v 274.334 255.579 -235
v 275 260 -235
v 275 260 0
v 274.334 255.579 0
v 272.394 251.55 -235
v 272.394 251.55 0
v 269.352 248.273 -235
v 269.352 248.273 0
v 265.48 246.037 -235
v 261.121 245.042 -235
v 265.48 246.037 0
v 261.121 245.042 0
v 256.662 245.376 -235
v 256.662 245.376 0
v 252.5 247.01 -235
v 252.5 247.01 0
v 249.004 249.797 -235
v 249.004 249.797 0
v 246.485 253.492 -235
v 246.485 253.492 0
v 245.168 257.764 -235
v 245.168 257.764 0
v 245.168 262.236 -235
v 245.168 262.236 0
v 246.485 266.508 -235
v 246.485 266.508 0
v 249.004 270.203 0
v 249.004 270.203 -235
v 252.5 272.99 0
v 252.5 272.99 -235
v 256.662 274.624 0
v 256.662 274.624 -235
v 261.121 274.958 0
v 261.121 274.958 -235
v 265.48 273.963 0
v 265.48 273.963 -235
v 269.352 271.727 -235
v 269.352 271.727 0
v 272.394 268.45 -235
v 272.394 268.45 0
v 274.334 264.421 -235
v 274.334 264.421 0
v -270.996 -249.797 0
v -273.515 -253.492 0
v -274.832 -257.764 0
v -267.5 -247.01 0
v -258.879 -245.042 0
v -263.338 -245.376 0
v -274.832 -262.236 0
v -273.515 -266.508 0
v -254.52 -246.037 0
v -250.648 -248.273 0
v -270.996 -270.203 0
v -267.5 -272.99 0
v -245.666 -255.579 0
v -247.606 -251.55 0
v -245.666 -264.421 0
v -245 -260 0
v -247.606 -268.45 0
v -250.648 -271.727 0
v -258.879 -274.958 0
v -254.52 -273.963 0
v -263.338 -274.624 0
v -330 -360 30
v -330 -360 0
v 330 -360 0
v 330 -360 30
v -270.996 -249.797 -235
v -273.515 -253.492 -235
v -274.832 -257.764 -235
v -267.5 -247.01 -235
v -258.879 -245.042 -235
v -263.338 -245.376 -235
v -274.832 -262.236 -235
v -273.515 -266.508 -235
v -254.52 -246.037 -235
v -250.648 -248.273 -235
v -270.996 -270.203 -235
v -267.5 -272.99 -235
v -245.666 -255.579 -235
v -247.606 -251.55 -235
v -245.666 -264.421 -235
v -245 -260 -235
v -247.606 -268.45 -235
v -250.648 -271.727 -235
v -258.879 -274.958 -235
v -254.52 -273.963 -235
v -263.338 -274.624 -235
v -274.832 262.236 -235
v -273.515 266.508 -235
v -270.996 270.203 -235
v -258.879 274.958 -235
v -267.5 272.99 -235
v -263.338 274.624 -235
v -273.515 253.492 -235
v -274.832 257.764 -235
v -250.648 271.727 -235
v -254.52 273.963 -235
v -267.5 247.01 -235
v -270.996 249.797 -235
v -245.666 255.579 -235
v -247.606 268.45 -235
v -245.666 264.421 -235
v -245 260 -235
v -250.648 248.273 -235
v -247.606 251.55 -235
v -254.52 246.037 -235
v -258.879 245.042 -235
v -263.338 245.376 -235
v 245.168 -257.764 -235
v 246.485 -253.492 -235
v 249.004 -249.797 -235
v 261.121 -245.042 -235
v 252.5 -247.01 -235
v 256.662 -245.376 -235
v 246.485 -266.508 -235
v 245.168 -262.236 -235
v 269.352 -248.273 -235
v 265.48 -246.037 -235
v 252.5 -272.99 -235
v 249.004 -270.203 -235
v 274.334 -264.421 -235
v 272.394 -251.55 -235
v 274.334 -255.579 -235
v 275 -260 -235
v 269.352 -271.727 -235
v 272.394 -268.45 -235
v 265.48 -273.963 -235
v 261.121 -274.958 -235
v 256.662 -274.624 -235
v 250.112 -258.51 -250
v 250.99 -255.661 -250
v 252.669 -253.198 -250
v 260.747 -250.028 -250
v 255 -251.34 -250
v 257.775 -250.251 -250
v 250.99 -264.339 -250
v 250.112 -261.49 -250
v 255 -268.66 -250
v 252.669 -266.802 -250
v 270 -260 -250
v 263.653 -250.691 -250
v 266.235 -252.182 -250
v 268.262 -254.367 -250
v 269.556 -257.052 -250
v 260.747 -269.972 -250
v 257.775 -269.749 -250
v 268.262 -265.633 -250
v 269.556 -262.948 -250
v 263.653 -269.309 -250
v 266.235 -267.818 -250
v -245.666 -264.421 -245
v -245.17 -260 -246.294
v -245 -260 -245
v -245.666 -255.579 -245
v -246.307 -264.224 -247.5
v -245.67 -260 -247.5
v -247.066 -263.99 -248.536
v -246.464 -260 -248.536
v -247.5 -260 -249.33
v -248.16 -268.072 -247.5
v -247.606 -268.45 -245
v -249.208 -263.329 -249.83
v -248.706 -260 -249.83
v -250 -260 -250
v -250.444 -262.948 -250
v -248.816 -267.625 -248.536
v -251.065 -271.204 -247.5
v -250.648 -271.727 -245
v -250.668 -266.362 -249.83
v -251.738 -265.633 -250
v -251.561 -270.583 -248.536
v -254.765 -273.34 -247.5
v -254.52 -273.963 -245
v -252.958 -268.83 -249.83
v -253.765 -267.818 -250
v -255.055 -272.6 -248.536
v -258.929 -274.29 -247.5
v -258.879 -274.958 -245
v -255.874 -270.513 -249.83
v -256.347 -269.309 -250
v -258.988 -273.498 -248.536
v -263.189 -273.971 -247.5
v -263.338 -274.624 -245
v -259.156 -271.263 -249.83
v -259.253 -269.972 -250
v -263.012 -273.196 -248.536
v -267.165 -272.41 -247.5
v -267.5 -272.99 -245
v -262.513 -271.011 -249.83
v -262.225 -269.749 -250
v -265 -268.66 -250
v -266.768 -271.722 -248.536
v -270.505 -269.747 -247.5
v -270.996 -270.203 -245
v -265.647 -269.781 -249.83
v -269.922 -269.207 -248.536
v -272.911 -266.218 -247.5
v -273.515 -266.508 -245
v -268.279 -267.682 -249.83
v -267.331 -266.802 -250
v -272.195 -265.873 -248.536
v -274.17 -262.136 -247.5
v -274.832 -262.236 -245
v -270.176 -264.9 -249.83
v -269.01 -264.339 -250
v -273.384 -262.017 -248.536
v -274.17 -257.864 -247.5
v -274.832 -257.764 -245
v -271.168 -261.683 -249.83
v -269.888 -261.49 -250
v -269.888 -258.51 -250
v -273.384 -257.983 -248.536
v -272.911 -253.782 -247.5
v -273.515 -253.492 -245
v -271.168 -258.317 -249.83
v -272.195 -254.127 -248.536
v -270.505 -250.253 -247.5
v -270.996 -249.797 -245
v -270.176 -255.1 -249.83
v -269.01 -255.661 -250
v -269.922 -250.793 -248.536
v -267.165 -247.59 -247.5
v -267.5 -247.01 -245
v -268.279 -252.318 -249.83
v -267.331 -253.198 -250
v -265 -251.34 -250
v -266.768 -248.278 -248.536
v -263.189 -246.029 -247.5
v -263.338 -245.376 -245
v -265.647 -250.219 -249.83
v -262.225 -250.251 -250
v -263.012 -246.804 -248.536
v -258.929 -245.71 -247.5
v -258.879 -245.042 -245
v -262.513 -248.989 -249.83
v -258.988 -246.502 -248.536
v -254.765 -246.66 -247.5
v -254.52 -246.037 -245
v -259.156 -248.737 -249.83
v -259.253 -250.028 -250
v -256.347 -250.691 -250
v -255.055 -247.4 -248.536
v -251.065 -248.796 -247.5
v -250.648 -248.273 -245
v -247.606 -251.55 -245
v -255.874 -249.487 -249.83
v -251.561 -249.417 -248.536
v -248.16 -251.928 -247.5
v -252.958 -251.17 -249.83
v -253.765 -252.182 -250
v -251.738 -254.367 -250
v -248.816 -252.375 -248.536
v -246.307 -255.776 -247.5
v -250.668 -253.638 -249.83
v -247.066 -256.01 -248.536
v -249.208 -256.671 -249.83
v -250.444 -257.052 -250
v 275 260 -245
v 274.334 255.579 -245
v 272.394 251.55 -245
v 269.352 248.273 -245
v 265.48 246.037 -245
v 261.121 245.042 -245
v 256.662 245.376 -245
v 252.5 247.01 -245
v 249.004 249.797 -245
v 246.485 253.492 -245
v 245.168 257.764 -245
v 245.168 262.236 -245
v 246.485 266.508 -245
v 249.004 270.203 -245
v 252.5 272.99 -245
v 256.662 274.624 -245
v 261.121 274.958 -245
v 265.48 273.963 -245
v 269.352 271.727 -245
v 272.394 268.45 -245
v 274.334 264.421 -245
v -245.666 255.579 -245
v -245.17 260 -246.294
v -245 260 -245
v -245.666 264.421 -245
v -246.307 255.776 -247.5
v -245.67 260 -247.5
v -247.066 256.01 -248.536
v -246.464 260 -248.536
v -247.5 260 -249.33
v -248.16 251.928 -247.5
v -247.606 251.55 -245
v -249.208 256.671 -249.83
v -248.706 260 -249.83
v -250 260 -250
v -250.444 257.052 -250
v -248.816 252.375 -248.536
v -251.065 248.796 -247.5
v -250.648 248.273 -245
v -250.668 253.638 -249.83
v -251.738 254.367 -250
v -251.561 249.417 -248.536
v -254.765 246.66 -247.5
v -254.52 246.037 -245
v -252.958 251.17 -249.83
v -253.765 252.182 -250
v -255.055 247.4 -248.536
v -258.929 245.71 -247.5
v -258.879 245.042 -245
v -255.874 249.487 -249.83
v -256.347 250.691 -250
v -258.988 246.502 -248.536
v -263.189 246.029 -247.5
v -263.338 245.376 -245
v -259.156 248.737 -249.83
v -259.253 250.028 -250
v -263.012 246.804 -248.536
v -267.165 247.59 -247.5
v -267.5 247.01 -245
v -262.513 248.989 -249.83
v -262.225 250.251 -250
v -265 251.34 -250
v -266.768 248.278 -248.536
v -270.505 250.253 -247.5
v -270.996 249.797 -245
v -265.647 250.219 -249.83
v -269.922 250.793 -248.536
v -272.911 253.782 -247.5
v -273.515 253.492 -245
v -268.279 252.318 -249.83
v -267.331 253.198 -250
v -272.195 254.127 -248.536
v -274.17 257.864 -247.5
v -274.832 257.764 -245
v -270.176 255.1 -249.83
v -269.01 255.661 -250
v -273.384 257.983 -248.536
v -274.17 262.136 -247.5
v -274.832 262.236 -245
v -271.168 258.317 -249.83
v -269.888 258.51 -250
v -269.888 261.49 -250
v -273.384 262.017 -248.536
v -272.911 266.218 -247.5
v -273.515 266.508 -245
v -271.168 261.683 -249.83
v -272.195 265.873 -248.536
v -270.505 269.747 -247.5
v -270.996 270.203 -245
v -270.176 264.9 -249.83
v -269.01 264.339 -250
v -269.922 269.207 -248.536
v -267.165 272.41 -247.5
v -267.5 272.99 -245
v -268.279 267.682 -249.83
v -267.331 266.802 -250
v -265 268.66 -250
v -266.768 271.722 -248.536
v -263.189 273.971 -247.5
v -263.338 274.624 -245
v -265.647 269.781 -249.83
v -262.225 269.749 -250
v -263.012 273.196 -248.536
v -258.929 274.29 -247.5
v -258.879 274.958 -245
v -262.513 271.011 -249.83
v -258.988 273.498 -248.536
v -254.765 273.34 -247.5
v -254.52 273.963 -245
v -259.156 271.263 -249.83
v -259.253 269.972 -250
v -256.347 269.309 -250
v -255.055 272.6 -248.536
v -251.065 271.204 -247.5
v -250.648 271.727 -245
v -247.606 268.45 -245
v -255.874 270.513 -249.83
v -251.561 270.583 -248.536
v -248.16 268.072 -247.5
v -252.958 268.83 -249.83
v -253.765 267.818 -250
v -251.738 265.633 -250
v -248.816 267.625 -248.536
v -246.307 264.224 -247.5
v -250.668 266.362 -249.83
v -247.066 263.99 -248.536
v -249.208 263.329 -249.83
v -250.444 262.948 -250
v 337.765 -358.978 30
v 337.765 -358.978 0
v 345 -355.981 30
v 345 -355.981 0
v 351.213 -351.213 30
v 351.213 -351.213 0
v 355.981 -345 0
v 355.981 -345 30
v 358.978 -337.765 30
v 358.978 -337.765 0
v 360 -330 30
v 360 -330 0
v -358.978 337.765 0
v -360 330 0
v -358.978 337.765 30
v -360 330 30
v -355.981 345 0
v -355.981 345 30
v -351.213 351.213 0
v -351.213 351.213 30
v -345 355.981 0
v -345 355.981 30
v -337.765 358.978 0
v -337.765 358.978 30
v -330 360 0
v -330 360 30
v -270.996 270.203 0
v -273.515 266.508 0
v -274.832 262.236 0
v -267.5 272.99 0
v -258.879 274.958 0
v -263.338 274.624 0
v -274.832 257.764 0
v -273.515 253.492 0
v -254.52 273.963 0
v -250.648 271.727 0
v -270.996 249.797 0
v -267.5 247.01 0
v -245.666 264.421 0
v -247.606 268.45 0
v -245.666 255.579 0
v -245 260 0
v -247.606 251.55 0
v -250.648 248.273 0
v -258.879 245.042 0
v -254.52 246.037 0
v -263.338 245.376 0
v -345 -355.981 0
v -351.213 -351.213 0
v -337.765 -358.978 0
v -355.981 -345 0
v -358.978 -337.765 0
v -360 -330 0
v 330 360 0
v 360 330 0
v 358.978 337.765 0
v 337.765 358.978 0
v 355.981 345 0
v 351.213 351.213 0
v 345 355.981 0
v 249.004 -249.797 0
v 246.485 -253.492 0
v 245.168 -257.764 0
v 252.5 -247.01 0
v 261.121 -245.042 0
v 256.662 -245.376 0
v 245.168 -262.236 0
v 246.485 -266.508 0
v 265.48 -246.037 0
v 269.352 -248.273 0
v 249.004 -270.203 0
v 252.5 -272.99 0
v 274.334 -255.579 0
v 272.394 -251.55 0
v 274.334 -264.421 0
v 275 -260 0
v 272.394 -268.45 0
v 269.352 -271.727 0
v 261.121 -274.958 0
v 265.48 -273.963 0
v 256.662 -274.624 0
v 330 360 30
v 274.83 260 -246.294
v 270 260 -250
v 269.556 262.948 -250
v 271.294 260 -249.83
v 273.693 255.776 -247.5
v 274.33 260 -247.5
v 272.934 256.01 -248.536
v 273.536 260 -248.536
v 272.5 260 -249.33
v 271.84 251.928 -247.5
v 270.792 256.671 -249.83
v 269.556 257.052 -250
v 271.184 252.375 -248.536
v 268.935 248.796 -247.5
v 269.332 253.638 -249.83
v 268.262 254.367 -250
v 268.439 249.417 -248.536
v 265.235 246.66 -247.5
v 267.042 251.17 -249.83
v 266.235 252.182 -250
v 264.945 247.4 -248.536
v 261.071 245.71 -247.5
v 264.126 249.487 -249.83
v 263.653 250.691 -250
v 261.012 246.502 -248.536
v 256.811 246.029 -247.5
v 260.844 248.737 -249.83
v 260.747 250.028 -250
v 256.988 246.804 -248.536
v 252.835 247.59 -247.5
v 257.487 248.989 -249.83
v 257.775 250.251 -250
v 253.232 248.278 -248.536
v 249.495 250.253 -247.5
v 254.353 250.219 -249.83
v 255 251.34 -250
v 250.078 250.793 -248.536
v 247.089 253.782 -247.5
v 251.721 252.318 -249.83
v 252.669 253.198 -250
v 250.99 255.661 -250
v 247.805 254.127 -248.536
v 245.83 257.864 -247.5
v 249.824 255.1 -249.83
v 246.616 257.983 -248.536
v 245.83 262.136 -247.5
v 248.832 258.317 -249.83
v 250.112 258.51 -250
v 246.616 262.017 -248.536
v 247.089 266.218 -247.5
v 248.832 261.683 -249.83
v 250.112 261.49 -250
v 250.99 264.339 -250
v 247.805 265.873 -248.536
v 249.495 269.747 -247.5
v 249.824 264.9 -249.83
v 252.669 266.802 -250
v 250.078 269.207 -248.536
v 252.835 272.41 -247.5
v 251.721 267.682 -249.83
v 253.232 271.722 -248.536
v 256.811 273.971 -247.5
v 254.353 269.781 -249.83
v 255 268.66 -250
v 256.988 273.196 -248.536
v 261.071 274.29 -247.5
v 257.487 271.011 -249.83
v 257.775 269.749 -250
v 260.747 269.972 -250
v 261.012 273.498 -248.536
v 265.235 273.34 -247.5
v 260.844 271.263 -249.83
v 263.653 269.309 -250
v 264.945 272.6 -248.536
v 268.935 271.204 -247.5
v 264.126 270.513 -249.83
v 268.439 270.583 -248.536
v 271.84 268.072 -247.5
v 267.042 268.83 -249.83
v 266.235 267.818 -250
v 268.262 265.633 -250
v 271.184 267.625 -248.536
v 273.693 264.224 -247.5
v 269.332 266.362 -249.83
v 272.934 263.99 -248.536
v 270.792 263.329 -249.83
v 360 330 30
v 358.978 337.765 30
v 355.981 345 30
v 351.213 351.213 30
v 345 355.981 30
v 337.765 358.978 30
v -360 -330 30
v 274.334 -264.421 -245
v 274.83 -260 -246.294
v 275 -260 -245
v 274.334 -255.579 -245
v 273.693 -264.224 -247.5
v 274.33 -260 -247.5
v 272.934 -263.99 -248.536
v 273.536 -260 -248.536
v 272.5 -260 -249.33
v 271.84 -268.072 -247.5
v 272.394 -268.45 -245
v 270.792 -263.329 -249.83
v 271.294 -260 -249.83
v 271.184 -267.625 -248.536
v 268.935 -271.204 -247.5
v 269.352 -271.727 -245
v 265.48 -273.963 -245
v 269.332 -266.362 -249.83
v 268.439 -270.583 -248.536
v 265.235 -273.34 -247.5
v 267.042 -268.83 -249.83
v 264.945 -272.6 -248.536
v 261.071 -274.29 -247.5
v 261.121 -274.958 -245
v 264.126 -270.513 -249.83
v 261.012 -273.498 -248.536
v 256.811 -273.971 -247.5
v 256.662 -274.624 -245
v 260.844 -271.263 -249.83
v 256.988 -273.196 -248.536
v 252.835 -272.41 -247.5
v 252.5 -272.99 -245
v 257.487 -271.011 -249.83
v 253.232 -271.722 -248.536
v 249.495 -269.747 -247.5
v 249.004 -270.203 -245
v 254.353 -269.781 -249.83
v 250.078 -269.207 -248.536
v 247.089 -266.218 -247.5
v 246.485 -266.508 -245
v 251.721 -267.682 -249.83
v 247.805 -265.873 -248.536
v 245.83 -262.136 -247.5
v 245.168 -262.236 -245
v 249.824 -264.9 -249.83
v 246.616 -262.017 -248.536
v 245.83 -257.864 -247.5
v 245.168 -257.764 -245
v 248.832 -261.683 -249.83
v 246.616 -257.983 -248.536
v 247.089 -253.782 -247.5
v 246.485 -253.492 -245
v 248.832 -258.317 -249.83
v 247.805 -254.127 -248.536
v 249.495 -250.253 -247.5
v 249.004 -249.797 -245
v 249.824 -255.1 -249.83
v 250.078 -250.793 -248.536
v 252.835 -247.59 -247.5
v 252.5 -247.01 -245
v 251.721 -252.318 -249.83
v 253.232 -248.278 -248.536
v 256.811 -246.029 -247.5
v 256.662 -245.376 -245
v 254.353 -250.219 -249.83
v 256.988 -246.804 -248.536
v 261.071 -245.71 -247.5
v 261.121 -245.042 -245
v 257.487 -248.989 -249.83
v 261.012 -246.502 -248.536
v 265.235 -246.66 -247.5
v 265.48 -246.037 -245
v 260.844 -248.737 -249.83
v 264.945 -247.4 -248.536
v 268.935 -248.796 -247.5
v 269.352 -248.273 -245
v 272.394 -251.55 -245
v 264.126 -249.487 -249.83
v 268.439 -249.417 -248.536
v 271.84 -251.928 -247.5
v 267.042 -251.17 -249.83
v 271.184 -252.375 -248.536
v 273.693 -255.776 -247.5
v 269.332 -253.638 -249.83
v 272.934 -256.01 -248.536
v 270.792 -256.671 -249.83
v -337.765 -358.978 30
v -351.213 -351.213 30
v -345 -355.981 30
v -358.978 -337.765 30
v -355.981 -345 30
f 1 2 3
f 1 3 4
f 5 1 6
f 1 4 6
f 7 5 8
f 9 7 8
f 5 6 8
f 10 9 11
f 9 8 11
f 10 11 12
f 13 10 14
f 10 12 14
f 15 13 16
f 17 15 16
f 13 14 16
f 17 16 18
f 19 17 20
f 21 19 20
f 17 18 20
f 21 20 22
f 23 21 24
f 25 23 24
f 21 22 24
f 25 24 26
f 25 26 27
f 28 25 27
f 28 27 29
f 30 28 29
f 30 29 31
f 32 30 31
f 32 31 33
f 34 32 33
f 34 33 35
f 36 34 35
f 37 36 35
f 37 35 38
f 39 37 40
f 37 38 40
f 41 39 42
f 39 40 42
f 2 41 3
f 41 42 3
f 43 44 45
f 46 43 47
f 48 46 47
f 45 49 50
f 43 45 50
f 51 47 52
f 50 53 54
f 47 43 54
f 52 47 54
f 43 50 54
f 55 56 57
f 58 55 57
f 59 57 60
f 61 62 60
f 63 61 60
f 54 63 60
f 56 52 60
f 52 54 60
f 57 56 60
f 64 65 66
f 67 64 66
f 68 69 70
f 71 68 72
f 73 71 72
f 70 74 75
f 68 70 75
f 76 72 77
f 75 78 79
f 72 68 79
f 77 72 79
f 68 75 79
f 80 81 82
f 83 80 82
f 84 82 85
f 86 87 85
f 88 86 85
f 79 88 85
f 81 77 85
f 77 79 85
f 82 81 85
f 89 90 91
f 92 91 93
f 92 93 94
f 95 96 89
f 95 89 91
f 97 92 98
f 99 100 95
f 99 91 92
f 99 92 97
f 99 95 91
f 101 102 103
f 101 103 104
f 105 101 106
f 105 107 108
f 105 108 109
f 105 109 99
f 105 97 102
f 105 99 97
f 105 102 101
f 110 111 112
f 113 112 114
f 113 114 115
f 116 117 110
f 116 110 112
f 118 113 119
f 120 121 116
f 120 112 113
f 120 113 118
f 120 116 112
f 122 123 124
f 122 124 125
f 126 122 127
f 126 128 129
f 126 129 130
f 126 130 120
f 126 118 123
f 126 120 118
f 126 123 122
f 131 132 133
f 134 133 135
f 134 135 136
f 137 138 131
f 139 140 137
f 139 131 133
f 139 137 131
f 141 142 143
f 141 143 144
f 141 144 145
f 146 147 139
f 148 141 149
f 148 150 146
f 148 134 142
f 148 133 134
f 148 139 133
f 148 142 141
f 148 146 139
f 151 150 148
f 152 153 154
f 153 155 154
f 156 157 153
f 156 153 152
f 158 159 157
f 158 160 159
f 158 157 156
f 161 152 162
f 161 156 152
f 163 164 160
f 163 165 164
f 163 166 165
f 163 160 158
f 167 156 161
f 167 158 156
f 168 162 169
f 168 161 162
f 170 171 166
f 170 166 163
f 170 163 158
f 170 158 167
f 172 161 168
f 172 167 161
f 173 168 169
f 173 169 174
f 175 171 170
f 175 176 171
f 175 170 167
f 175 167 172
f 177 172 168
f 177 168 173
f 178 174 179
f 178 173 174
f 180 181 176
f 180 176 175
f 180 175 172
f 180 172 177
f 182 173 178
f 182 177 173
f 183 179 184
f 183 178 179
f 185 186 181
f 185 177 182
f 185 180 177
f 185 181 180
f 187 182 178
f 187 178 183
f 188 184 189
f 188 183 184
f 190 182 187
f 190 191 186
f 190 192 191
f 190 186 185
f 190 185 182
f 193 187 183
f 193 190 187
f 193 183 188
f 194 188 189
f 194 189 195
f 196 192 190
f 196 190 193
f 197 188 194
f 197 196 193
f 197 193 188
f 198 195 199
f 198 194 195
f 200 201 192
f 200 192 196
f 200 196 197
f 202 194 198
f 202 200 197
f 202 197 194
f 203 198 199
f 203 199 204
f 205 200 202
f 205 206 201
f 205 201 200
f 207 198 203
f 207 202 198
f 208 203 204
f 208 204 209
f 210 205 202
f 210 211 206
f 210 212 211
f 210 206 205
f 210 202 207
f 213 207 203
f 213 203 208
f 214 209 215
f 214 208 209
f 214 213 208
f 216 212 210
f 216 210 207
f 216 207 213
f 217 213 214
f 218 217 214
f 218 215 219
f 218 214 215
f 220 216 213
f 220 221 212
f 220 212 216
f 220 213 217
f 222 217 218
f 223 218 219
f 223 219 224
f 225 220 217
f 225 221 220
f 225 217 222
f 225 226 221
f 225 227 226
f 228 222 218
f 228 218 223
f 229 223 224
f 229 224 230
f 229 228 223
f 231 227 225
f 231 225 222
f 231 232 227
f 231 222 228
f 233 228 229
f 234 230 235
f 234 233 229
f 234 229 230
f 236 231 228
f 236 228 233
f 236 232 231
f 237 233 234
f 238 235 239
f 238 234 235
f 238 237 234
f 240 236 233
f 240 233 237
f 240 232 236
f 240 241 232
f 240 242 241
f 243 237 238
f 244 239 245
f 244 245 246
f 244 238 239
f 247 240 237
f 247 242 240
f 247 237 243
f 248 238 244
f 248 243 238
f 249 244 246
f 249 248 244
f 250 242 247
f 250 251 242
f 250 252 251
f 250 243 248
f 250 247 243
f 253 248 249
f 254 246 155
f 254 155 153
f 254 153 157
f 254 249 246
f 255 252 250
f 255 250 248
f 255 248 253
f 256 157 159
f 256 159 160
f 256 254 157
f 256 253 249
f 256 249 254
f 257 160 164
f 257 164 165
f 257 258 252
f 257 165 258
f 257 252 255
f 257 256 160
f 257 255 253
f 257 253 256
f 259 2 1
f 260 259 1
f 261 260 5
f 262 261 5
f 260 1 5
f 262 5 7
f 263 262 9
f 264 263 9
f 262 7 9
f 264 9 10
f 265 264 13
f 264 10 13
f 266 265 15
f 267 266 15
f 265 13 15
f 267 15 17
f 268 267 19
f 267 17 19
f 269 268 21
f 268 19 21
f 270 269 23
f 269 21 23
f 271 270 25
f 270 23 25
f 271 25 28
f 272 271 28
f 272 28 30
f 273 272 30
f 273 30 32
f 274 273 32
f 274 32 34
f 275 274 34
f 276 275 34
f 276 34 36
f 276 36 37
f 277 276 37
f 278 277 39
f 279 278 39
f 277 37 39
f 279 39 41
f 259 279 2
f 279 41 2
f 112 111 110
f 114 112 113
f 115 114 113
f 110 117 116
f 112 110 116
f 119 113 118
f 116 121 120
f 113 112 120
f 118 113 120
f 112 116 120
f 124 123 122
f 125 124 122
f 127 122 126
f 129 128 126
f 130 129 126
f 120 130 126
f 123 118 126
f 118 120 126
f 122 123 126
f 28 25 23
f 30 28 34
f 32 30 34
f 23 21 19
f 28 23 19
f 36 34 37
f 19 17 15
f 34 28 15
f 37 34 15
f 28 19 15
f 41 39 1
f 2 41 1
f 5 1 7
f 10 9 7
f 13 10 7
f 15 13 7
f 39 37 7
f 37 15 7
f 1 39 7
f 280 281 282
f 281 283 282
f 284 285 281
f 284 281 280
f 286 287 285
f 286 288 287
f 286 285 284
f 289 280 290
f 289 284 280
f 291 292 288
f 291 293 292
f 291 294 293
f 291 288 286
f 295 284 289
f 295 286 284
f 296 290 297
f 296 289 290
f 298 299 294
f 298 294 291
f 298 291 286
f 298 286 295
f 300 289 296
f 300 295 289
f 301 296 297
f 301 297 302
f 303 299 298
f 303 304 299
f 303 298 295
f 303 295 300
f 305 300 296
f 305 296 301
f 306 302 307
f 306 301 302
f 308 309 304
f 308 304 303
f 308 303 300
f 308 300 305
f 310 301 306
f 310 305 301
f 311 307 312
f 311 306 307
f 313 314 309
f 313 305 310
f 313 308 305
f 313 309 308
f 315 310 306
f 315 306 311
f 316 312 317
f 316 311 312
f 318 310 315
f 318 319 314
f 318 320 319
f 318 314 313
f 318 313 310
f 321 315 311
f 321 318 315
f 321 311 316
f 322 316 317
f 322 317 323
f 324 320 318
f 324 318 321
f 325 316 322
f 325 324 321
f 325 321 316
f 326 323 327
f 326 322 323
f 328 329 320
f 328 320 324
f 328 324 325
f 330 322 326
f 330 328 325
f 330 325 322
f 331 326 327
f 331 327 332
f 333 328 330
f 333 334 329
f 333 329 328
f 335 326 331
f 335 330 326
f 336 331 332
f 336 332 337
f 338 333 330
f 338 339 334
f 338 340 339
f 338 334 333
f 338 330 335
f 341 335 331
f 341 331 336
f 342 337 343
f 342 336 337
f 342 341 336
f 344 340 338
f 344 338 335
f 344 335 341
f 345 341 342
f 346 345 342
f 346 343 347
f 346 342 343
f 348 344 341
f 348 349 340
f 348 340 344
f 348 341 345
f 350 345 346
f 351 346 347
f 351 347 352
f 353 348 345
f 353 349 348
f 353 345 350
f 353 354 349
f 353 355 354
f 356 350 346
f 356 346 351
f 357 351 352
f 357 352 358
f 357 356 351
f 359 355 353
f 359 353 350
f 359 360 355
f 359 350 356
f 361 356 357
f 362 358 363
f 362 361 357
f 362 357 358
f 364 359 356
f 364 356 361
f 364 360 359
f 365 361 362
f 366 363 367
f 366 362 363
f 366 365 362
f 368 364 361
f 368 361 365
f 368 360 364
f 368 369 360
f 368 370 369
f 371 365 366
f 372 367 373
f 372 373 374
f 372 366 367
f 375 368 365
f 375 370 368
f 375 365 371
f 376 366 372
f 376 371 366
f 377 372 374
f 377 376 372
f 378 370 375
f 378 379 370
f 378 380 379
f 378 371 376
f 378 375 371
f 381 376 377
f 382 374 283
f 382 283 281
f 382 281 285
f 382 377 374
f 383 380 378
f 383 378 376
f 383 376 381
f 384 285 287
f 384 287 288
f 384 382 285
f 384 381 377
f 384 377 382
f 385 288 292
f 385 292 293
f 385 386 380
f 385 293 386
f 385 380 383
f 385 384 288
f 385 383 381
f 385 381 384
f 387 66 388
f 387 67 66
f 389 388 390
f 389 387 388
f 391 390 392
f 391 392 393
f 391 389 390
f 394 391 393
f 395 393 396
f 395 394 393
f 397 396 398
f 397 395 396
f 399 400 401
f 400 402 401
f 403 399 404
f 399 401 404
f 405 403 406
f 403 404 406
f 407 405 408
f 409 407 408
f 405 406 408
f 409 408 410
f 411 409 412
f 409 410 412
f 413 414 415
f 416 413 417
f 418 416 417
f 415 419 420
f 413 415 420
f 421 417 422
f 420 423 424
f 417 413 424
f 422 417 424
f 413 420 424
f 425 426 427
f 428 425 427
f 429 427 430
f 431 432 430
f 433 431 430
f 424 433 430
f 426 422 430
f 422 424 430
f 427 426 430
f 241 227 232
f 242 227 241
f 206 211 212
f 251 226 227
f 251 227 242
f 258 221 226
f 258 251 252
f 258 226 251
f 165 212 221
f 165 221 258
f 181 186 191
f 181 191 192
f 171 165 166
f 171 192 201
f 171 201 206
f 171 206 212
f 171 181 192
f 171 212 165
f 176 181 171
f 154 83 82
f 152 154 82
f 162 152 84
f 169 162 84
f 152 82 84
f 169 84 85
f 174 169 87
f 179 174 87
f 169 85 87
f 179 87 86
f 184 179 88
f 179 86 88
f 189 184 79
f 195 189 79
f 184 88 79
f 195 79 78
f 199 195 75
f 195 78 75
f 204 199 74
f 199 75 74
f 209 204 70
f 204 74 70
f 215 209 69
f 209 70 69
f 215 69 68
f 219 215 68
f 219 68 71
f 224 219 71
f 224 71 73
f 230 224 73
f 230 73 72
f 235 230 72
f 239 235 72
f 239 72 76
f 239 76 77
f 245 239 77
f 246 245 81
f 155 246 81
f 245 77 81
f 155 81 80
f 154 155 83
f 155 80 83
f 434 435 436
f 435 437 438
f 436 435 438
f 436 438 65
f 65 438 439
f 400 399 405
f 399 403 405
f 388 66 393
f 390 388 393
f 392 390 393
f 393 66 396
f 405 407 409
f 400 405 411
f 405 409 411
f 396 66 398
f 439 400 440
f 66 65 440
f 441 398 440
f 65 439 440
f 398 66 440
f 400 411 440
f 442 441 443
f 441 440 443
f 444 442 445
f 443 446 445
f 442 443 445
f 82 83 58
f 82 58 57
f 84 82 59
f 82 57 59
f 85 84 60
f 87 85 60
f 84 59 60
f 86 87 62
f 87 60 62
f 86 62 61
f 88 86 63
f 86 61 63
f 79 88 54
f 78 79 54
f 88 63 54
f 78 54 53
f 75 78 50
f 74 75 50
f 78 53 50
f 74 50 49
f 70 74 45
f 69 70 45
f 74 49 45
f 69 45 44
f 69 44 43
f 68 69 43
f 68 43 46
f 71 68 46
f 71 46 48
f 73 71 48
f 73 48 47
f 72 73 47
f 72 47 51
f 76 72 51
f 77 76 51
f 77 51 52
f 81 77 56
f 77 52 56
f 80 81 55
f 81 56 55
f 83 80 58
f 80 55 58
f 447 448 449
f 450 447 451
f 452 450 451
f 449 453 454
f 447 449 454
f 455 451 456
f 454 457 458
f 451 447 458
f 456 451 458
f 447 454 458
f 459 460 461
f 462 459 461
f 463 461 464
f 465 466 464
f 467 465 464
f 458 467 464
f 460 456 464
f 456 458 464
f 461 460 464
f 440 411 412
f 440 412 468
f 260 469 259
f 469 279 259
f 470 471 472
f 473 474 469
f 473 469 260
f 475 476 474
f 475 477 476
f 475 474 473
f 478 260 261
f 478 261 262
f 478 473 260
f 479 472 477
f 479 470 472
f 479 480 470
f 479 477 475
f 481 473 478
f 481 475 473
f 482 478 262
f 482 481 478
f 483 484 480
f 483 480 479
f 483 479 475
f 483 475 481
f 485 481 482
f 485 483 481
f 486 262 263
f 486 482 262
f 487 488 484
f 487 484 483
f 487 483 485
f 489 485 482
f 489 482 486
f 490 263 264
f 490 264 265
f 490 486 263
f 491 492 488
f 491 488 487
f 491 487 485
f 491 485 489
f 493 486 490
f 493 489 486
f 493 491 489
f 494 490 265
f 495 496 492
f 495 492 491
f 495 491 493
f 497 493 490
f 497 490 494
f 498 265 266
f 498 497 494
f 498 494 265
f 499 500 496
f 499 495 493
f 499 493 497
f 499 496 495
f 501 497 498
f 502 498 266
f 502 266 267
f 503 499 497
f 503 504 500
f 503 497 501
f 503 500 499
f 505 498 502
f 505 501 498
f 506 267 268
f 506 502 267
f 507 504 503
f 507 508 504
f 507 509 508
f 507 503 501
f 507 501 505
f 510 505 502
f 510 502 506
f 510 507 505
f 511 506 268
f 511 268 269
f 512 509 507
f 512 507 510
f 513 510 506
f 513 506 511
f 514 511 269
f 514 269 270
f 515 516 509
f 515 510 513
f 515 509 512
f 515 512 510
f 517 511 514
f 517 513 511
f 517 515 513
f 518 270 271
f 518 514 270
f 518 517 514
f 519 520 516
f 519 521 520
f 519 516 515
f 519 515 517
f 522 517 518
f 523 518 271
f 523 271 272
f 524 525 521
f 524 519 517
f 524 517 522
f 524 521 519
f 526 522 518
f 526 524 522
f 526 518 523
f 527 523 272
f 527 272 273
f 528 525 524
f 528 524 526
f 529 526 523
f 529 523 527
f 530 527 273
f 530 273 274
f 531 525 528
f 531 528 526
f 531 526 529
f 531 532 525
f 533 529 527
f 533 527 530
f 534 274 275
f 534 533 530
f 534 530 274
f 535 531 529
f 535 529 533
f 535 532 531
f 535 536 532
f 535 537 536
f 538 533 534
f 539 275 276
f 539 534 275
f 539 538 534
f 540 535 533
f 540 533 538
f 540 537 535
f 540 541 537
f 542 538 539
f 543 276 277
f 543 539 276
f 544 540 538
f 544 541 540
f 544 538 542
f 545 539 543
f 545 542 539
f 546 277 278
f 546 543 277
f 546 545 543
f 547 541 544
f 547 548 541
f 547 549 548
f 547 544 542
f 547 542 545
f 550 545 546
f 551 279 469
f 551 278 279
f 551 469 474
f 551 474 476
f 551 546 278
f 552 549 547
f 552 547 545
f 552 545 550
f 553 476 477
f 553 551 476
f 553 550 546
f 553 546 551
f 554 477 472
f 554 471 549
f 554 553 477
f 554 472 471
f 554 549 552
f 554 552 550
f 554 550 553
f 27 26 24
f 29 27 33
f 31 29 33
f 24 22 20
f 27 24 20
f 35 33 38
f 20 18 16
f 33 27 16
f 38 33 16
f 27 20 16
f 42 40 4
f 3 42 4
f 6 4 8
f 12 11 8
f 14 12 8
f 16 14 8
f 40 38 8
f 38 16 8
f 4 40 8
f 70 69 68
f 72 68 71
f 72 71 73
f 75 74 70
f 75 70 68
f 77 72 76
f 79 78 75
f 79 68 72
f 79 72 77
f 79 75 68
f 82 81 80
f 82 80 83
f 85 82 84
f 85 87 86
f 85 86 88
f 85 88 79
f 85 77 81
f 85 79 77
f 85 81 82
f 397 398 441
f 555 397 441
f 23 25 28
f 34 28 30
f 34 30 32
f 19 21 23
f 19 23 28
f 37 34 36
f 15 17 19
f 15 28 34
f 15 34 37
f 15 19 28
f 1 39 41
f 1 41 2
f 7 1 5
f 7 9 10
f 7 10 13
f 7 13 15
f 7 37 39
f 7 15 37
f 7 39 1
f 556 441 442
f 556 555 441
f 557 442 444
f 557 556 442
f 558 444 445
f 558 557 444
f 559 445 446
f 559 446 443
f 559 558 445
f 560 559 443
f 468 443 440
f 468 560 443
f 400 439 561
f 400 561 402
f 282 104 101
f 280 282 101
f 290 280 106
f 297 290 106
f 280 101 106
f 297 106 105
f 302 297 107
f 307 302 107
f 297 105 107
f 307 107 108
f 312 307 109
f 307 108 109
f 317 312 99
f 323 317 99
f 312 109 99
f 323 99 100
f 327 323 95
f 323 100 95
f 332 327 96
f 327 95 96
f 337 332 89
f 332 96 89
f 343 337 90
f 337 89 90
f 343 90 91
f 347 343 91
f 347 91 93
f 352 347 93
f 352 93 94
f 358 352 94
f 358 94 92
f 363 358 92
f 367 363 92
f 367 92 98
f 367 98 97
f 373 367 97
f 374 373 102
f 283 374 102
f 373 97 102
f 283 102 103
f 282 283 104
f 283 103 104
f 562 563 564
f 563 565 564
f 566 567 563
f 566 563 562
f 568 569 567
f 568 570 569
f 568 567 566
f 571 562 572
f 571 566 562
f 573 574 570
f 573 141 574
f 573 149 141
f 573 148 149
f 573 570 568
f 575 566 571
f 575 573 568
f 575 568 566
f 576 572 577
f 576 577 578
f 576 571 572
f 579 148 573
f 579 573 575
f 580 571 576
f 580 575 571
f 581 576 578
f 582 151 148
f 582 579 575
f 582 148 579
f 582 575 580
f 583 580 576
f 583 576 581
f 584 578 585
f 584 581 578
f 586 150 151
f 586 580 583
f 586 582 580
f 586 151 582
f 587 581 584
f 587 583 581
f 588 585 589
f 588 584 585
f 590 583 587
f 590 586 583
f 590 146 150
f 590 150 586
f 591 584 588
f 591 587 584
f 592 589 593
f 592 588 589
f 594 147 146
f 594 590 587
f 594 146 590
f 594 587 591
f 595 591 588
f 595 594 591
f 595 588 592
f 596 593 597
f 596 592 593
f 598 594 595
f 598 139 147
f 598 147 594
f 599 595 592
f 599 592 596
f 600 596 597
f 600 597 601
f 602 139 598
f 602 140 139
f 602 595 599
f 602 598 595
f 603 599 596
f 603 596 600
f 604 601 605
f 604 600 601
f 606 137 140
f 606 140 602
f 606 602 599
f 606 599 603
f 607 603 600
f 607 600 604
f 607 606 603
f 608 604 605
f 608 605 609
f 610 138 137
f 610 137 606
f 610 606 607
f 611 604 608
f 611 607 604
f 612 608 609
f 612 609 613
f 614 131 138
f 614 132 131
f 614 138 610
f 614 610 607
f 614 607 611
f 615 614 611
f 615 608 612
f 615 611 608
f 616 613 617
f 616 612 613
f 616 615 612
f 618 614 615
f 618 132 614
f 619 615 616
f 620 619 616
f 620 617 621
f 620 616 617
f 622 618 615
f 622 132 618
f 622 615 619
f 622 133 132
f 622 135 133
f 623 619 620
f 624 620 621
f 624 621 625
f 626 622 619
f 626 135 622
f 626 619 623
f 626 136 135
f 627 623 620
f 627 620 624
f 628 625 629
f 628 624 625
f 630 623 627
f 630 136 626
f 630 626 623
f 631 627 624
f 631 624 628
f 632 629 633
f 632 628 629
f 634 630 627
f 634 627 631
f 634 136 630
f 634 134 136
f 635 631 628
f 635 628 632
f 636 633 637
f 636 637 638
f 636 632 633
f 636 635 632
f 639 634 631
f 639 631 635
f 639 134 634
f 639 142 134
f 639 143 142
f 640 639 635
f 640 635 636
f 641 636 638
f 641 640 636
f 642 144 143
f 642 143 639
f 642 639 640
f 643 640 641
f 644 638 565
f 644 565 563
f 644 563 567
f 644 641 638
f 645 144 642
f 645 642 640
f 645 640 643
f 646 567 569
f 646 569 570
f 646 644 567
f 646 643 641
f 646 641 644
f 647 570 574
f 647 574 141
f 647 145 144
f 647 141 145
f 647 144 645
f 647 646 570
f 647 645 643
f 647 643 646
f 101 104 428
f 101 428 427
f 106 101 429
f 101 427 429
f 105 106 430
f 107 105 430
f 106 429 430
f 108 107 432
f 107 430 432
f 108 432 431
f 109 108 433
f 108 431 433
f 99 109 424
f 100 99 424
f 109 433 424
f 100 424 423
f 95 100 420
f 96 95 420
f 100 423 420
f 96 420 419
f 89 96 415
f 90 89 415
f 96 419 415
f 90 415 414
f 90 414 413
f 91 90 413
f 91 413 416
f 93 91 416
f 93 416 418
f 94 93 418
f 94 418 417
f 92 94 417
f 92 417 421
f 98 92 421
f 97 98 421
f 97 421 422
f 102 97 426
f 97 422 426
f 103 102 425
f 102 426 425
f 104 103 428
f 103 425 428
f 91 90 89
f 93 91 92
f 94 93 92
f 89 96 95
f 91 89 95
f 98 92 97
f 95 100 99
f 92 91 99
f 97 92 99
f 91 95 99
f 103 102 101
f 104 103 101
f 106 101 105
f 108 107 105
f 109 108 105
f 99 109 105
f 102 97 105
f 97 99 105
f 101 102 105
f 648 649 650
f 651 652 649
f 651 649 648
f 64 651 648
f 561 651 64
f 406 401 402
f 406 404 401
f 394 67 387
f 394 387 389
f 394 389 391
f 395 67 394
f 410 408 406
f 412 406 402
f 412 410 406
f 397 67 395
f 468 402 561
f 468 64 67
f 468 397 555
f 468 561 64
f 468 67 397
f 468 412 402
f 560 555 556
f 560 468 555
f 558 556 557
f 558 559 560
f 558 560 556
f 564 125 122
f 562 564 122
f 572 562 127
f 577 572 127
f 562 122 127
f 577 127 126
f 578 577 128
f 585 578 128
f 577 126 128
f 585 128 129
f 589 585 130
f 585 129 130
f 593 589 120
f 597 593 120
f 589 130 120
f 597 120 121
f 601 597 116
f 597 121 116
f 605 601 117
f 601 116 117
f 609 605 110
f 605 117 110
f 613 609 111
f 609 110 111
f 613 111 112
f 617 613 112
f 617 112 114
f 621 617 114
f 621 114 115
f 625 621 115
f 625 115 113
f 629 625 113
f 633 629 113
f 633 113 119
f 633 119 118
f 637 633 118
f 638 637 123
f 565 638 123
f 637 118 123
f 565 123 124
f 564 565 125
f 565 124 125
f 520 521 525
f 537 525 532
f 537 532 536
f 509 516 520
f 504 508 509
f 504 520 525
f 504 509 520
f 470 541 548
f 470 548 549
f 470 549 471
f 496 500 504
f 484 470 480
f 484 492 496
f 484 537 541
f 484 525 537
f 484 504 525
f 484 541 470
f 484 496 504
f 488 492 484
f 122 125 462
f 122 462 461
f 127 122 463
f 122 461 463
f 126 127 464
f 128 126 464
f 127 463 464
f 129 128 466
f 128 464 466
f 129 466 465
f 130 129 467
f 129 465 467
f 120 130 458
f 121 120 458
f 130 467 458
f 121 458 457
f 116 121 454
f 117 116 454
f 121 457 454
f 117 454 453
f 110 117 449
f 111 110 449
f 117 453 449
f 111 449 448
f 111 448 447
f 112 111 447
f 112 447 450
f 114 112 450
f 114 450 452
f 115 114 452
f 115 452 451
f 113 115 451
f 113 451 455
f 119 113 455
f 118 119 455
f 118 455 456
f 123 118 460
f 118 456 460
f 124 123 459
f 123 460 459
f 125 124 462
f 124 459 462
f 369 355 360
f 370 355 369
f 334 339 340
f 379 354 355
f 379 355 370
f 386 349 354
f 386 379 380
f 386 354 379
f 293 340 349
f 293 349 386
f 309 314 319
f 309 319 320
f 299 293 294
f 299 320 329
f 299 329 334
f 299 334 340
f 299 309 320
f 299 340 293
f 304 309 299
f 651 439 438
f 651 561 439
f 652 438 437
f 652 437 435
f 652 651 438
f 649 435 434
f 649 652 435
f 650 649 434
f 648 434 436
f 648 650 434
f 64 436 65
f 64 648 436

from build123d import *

# Parameters (mm, degrees)
F0_W     = 720
F0_H     = 720
F1_DEPTH = 30
F2_R     = 30
F3_R     = 15
F4_DEPTH = 235
F5_R     = 15
F6_DEPTH = 15
F7_R     = 5


with BuildPart() as f1:
    # F0 (on Top) → F1 (new body)
    with BuildSketch(Plane.XY):
        Rectangle(F0_W, F0_H)
    extrude(amount=F1_DEPTH)

    # F2
    f2_edges = [f1.edges().sort_by_distance(p)[0] for p in [
        (-360, -360, 15),
        (360, -360, 15),
        (360, 360, 15),
        (-360, 360, 15),
    ]]
    fillet(f2_edges, radius=F2_R)


with BuildPart() as f4:
    # F3 (on face) → F4 (new body)
    with BuildSketch(Plane(origin=(0, 0, 0), x_dir=(1, 0, 0), z_dir=(0, 0, -1))):
        with Locations((260, 260)):
            Circle(F3_R)
        with Locations((-260, 260)):
            Circle(F3_R)
        with Locations((-260, -260)):
            Circle(F3_R)
        with Locations((260, -260)):
            Circle(F3_R)
    extrude(amount=F4_DEPTH)


with BuildPart() as f6:
    # F5 (on face) → F6 (new body)
    with BuildSketch(Plane(origin=(0, 0, -235), x_dir=(1, 0, 0), z_dir=(0, 0, -1))):
        with Locations((-260, 260)):
            Circle(F5_R)
        with Locations((260, 260)):
            Circle(F5_R)
        with Locations((260, -260)):
            Circle(F5_R)
        with Locations((-260, -260)):
            Circle(F5_R)
    extrude(amount=F6_DEPTH)

    # F7
    f7_edges = [f6.edges().sort_by_distance(p)[0] for p in [
        (-275, -260, -250),
        (-275, 260, -250),
        (245, 260, -250),
        (245, -260, -250),
    ]]
    fillet(f7_edges, radius=F7_R)


solid = Compound([f1.part, f4.part, f6.part])
